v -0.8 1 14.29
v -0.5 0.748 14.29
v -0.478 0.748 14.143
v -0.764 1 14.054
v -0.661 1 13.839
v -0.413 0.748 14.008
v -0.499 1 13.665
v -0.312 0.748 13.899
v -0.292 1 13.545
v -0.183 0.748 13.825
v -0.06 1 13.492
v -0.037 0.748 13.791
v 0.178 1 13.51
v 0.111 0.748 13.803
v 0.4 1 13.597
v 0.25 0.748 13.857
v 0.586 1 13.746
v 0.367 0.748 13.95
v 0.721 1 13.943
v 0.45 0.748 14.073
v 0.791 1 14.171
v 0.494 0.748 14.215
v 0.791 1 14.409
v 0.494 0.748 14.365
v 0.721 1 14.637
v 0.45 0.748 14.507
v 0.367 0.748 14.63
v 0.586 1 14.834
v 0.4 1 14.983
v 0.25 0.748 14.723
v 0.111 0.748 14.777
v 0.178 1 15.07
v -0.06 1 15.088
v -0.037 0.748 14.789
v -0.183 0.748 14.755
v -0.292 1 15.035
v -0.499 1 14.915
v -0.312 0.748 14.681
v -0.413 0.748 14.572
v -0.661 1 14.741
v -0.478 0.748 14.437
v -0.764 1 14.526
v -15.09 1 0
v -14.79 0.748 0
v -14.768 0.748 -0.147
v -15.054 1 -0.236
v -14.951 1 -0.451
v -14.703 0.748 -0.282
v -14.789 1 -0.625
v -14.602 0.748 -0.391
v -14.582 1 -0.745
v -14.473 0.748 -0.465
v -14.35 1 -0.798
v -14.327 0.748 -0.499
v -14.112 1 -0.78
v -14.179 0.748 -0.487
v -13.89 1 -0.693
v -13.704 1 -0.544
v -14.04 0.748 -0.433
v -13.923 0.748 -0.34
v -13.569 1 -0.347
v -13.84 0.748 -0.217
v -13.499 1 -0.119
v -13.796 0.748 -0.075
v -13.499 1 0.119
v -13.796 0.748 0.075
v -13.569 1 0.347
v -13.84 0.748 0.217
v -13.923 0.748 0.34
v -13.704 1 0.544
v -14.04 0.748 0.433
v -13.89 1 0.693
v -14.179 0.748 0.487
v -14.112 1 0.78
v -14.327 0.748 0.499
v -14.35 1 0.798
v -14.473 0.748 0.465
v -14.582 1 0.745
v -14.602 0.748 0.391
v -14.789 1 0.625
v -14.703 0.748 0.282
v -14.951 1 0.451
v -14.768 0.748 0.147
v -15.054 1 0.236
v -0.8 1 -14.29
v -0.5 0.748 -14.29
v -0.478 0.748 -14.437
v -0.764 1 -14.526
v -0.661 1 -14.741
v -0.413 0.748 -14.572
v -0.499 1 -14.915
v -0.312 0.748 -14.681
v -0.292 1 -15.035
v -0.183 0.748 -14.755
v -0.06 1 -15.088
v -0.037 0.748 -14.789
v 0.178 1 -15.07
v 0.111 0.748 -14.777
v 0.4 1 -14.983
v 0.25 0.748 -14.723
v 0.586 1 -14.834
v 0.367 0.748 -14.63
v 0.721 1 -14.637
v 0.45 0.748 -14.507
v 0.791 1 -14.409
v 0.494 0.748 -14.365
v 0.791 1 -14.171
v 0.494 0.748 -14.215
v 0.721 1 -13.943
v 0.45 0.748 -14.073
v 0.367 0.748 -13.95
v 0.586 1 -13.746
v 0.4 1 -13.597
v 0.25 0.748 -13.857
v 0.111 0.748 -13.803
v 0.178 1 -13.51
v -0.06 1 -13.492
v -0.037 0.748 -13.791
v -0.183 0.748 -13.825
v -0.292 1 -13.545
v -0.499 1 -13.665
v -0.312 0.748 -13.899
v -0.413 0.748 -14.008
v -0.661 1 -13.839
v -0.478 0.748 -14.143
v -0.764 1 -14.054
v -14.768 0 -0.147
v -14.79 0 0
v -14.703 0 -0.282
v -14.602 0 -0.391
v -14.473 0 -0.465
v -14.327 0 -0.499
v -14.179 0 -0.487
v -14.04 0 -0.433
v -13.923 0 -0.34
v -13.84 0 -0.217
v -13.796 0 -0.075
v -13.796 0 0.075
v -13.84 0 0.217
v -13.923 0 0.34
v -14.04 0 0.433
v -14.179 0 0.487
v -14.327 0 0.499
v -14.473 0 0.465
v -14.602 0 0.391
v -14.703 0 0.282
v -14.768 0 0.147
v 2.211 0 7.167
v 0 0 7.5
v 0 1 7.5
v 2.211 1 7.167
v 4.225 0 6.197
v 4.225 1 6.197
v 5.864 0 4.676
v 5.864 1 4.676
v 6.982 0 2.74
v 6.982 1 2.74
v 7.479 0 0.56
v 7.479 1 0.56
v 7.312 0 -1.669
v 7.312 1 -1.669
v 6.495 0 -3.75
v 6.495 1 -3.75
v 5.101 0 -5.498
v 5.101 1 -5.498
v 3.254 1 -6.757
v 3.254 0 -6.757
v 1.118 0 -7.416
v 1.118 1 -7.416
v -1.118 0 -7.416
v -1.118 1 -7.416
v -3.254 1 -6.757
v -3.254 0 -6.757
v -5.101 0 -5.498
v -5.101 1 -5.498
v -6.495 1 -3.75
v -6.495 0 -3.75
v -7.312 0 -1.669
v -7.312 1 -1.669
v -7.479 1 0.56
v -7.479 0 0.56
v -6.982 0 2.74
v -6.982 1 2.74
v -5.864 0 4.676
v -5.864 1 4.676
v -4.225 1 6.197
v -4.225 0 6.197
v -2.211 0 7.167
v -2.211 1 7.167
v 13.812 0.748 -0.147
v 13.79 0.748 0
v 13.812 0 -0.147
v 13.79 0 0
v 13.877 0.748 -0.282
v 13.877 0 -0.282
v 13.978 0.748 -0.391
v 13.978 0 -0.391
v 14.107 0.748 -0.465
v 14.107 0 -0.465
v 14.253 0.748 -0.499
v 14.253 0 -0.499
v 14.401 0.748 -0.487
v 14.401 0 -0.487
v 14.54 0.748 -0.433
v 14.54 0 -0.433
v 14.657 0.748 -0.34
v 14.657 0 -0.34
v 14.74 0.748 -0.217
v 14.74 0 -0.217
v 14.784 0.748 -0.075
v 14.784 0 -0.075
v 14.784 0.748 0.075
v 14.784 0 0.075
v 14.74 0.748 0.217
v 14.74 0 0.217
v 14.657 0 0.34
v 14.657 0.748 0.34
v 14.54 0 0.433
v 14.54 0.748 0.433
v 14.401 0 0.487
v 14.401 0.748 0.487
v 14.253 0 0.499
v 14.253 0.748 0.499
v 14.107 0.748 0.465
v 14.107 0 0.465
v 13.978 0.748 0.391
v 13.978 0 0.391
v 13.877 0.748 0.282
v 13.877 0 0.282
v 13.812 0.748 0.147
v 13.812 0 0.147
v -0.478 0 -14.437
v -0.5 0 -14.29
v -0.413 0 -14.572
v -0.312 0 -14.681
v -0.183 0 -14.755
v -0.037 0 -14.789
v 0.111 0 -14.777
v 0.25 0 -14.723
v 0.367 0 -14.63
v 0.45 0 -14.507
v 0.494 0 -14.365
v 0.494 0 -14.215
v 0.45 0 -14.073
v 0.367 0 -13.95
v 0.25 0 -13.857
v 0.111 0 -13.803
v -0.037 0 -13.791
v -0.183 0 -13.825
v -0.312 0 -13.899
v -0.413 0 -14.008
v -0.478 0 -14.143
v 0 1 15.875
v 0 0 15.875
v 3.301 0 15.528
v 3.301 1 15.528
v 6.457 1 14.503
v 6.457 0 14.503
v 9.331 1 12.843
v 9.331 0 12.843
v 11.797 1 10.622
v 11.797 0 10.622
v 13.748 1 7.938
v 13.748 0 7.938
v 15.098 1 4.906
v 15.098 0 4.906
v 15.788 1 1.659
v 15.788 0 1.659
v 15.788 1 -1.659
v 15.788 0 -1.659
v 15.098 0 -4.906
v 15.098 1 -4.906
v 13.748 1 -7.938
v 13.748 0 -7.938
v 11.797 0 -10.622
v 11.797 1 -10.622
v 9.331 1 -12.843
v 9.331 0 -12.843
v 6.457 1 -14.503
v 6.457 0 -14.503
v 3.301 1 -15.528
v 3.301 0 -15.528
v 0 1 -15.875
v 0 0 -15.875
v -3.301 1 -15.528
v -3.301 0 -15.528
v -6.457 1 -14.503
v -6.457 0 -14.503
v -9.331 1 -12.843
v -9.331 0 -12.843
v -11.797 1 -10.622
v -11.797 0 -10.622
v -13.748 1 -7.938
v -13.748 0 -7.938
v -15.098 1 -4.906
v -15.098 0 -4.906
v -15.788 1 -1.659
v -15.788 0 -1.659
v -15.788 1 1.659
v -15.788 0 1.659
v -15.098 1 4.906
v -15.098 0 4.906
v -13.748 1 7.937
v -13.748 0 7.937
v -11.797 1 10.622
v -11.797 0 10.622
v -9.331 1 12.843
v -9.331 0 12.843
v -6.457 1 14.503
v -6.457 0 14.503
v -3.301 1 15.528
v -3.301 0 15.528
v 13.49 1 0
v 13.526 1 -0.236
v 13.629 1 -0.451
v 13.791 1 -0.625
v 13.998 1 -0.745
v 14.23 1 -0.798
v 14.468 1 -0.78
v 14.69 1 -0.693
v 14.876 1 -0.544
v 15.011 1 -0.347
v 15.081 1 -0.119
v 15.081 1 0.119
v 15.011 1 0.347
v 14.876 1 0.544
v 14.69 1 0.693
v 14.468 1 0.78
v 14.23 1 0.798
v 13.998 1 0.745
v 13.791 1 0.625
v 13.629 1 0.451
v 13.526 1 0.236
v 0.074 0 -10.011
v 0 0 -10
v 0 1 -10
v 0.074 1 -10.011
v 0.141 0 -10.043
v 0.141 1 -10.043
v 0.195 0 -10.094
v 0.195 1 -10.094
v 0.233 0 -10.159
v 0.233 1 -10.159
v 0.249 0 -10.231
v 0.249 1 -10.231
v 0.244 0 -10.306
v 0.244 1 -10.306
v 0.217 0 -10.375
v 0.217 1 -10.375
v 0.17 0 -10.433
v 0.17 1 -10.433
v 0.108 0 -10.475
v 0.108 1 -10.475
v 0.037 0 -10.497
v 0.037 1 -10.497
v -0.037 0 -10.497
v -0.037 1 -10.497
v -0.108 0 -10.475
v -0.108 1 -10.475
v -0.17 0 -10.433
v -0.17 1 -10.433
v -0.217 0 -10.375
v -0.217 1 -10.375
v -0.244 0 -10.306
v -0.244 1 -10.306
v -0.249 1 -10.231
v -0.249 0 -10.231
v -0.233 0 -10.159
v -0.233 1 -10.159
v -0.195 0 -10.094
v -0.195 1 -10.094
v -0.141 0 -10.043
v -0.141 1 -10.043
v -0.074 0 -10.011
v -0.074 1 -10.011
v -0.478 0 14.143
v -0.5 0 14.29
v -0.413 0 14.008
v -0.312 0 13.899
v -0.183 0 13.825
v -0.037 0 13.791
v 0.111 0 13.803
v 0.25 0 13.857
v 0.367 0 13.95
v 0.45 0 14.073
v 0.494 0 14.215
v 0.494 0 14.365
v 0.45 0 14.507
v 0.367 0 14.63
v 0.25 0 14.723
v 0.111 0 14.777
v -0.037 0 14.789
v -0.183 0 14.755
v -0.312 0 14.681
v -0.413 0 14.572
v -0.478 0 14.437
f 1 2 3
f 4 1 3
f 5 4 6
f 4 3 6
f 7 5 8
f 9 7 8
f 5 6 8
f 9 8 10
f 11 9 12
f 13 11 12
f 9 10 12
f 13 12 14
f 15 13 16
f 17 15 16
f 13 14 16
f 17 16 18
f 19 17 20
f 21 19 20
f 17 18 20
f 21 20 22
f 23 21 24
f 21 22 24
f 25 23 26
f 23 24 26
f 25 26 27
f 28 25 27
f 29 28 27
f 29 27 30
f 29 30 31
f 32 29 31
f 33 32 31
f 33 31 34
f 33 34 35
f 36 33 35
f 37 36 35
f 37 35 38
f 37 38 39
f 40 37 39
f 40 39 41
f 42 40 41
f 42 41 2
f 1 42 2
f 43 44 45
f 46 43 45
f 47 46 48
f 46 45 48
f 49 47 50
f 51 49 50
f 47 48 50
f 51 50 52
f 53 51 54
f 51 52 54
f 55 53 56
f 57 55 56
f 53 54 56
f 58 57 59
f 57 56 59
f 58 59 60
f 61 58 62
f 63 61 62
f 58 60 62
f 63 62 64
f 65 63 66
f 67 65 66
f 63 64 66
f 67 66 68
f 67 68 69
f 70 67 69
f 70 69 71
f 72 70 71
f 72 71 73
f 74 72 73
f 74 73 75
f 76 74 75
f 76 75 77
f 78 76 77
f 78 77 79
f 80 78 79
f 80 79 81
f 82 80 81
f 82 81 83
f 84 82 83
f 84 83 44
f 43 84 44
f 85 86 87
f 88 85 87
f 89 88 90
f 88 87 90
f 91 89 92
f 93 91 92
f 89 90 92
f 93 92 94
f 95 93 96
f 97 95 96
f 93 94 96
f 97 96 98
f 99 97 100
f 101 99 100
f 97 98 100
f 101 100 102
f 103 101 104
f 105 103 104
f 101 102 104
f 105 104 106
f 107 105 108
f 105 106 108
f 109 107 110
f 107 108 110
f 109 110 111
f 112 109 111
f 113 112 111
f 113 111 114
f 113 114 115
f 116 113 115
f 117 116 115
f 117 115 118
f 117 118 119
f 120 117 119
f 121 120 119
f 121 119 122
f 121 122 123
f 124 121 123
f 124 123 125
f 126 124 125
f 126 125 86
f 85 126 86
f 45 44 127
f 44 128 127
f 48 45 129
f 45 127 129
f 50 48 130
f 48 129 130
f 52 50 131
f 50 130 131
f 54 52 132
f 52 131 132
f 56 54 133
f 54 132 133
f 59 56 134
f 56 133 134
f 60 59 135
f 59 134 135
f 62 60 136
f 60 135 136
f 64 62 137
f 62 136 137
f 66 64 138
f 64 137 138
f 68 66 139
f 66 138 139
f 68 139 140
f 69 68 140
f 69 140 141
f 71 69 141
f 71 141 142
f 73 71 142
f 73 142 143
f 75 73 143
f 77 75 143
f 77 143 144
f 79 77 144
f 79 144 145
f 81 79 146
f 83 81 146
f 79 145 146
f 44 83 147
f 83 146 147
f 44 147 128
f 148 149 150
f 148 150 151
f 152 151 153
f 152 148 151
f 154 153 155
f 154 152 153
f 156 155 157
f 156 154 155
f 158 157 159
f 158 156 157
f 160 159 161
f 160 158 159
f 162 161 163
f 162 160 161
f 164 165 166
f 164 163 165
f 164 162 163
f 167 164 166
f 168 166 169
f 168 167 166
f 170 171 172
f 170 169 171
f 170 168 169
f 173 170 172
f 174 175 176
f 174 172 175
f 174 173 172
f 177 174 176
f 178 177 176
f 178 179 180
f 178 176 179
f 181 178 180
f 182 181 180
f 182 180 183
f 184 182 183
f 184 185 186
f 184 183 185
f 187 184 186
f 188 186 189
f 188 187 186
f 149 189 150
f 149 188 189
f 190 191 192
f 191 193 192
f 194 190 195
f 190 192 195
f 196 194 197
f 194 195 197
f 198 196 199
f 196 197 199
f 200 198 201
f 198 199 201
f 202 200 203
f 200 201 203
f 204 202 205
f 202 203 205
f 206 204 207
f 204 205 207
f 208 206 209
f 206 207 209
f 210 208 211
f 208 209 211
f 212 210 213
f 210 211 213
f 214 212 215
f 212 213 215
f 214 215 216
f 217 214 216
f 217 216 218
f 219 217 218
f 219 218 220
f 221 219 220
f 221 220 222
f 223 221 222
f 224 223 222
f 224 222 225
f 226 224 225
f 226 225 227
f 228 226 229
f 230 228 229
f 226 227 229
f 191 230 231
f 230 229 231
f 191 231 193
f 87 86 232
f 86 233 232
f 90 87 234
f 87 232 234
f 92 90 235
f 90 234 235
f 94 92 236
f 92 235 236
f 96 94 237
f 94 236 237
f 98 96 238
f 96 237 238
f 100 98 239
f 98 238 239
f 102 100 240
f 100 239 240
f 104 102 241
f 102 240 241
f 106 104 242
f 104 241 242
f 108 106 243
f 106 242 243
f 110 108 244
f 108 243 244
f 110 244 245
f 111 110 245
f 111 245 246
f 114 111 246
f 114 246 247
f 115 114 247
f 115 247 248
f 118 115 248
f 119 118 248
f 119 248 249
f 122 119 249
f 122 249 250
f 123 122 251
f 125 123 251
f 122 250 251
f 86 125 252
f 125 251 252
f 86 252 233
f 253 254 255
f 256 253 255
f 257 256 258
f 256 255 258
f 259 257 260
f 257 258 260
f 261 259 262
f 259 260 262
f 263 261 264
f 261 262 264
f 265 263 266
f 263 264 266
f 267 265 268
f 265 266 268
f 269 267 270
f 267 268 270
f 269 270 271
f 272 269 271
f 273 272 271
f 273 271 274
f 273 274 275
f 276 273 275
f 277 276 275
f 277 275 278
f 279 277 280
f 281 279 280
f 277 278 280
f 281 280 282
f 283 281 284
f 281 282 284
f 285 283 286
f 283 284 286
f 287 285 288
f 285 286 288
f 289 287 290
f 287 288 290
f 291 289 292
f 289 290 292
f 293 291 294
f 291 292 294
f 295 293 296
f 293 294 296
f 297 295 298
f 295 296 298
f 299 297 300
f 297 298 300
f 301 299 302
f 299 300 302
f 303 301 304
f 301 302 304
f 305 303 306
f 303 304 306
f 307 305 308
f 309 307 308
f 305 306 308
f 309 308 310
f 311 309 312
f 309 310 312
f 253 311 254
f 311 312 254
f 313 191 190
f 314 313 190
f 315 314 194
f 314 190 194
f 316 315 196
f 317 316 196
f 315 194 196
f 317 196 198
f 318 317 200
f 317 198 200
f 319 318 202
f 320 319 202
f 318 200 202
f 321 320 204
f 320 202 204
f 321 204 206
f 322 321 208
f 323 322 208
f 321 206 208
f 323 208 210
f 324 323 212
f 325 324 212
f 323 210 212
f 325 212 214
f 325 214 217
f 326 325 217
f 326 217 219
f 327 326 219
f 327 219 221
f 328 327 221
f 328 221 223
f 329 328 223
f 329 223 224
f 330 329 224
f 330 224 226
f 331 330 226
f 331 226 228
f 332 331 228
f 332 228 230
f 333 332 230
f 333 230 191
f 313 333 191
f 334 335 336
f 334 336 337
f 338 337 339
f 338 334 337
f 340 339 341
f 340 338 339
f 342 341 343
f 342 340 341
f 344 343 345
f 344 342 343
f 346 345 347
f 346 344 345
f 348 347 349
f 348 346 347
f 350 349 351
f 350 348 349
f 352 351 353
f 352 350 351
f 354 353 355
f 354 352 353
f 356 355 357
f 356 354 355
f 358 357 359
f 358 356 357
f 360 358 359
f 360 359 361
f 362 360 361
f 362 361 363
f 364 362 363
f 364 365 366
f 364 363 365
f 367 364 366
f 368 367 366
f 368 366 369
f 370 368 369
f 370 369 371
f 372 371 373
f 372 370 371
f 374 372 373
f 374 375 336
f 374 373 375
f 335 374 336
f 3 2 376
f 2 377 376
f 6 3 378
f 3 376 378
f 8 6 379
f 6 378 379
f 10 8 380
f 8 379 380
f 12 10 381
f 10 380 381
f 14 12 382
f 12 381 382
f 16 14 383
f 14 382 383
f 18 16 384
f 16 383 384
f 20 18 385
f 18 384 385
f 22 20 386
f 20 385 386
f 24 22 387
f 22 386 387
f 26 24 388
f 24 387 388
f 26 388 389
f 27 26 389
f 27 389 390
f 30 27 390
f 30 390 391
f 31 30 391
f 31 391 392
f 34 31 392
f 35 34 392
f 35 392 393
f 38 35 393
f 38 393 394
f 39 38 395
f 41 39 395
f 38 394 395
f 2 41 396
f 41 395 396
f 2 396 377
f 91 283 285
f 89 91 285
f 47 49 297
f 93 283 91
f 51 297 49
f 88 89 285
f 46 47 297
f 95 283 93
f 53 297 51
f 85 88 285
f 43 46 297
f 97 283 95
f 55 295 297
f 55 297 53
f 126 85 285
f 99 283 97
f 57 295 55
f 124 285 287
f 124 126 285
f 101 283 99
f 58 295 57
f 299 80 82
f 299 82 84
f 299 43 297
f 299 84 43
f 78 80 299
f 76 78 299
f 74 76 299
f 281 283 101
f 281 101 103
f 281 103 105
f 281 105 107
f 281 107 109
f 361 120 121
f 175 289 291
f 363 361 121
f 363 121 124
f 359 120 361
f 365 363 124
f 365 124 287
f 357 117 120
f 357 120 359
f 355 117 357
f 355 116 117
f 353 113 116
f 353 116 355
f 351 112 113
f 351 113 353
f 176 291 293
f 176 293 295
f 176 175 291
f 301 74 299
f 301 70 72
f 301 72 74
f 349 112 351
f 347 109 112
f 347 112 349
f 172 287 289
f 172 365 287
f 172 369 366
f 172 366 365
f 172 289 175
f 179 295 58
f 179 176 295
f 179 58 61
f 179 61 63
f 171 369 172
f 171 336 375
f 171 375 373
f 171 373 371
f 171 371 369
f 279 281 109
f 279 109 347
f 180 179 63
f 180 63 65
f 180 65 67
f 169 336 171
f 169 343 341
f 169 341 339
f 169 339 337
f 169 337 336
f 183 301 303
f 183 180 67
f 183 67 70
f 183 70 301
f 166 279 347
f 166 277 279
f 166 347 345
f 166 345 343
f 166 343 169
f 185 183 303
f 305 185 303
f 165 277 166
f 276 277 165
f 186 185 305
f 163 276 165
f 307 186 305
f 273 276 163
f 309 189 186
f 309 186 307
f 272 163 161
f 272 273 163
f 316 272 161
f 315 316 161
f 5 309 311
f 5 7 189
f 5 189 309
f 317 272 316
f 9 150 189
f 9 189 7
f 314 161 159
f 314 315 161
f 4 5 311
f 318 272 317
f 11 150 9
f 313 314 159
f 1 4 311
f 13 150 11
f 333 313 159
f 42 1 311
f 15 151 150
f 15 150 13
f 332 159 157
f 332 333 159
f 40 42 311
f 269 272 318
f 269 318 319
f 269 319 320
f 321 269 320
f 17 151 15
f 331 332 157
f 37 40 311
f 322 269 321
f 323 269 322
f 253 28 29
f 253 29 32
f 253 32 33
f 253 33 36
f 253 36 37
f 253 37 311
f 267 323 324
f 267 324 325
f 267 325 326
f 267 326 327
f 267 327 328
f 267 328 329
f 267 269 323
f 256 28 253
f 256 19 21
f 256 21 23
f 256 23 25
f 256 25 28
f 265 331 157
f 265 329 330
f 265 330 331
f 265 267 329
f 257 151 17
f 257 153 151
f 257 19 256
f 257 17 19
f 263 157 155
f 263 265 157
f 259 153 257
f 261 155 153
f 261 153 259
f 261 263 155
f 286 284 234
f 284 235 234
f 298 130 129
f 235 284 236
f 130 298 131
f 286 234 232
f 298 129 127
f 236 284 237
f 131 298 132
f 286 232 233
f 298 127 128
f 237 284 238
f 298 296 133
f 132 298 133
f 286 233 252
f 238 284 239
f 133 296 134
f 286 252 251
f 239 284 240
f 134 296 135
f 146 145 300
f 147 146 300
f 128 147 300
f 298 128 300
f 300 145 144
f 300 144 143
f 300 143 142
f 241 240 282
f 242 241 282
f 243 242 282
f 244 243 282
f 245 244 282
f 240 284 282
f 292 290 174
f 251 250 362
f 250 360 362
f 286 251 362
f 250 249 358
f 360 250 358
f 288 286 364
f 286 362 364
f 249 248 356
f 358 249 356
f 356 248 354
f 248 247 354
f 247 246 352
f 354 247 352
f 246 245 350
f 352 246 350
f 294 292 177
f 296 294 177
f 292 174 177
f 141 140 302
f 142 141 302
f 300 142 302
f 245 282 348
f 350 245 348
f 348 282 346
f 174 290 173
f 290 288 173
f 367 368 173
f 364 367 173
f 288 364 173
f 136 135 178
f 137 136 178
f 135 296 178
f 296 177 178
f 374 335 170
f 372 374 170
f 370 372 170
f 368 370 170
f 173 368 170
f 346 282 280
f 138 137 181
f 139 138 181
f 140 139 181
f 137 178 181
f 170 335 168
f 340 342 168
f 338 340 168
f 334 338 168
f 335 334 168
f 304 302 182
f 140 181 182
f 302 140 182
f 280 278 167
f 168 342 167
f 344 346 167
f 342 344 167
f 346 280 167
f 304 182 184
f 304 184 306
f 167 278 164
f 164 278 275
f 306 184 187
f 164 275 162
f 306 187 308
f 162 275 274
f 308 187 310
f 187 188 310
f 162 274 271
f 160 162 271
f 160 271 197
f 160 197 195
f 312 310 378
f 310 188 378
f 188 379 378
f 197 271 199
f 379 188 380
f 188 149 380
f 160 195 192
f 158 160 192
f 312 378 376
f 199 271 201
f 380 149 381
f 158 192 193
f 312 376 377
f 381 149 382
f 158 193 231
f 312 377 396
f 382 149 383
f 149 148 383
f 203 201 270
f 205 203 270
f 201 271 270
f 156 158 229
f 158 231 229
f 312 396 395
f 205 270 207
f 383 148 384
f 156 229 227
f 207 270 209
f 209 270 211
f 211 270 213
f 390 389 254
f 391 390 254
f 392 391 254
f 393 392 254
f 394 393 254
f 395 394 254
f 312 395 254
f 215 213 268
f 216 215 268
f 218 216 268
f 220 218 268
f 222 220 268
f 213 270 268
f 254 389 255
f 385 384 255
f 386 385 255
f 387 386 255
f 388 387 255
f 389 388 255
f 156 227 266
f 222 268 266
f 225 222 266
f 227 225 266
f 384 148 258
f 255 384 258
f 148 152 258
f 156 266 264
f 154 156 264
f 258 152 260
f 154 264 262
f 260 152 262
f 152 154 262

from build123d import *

# Parameters (mm, degrees)
SKETCH1_R                                       = 15.875
BOSS_EXTRUDE1_DEPTH                             = 1
CUT_EXTRUDE1_DEPTH                              = 23.472900347
CUT_EXTRUDE1_DEPTH_BACK                         = 23.472900347
SKETCH2_R                                       = 7.5
CUT_EXTRUDE2_DEPTH                              = 23.472900347
CUT_EXTRUDE2_DEPTH_BACK                         = 23.472900347
SKETCH4_R                                       = 0.25
CSK_FOR_M2_FLAT_HEAD_MACHINE_SCREW1_D           = 1
CSK_FOR_M2_FLAT_HEAD_MACHINE_SCREW1_CSINK_D     = 1.6
CSK_FOR_M2_FLAT_HEAD_MACHINE_SCREW1_CSINK_ANGLE = 100


with BuildPart() as part:
    # Sketch1 → Boss-Extrude1 (new body)
    with BuildSketch(Plane(origin=(0, 0, 0), x_dir=(1, 0, 0), z_dir=(0, 1, 0))):
        with Locations(Location((0, 0, 0), (0, 0, 270))):
            Circle(SKETCH1_R)
    extrude(amount=BOSS_EXTRUDE1_DEPTH)

    # Sketch2 → Cut-Extrude1 (cut, two sides: drawn at the far end of the back side and taken through both)
    with BuildSketch(Plane(origin=(0, 1, 0), x_dir=(1, 0, 0), z_dir=(0, 1, 0)).offset(-CUT_EXTRUDE1_DEPTH_BACK)):
        with Locations(Location((0, 0, 0), (0, 0, 270))):
            Circle(SKETCH2_R)
    extrude(amount=CUT_EXTRUDE1_DEPTH + CUT_EXTRUDE1_DEPTH_BACK, mode=Mode.SUBTRACT)

    # Sketch4 → Cut-Extrude2 (cut, two sides: drawn at the far end of the back side and taken through both)
    with BuildSketch(Plane(origin=(0, 1, 0), x_dir=(1, 0, 0), z_dir=(0, 1, 0)).offset(-CUT_EXTRUDE2_DEPTH_BACK)):
        with Locations(Location((0, 10.25, 0), (0, 0, 270))):
            Circle(SKETCH4_R)
    extrude(amount=CUT_EXTRUDE2_DEPTH + CUT_EXTRUDE2_DEPTH_BACK, mode=Mode.SUBTRACT)

    # CSK for M2 Flat Head Machine Screw1 (through all)
    with Locations(Plane(origin=(0, 1, 0), x_dir=(1, 0, 0), z_dir=(0, 1, 0))):
        with Locations((0, 14.29), (14.29, 0), (0, -14.29), (-14.29, 0)):
            CounterSinkHole(CSK_FOR_M2_FLAT_HEAD_MACHINE_SCREW1_D / 2, CSK_FOR_M2_FLAT_HEAD_MACHINE_SCREW1_CSINK_D / 2, counter_sink_angle=CSK_FOR_M2_FLAT_HEAD_MACHINE_SCREW1_CSINK_ANGLE)


solid = part.part
